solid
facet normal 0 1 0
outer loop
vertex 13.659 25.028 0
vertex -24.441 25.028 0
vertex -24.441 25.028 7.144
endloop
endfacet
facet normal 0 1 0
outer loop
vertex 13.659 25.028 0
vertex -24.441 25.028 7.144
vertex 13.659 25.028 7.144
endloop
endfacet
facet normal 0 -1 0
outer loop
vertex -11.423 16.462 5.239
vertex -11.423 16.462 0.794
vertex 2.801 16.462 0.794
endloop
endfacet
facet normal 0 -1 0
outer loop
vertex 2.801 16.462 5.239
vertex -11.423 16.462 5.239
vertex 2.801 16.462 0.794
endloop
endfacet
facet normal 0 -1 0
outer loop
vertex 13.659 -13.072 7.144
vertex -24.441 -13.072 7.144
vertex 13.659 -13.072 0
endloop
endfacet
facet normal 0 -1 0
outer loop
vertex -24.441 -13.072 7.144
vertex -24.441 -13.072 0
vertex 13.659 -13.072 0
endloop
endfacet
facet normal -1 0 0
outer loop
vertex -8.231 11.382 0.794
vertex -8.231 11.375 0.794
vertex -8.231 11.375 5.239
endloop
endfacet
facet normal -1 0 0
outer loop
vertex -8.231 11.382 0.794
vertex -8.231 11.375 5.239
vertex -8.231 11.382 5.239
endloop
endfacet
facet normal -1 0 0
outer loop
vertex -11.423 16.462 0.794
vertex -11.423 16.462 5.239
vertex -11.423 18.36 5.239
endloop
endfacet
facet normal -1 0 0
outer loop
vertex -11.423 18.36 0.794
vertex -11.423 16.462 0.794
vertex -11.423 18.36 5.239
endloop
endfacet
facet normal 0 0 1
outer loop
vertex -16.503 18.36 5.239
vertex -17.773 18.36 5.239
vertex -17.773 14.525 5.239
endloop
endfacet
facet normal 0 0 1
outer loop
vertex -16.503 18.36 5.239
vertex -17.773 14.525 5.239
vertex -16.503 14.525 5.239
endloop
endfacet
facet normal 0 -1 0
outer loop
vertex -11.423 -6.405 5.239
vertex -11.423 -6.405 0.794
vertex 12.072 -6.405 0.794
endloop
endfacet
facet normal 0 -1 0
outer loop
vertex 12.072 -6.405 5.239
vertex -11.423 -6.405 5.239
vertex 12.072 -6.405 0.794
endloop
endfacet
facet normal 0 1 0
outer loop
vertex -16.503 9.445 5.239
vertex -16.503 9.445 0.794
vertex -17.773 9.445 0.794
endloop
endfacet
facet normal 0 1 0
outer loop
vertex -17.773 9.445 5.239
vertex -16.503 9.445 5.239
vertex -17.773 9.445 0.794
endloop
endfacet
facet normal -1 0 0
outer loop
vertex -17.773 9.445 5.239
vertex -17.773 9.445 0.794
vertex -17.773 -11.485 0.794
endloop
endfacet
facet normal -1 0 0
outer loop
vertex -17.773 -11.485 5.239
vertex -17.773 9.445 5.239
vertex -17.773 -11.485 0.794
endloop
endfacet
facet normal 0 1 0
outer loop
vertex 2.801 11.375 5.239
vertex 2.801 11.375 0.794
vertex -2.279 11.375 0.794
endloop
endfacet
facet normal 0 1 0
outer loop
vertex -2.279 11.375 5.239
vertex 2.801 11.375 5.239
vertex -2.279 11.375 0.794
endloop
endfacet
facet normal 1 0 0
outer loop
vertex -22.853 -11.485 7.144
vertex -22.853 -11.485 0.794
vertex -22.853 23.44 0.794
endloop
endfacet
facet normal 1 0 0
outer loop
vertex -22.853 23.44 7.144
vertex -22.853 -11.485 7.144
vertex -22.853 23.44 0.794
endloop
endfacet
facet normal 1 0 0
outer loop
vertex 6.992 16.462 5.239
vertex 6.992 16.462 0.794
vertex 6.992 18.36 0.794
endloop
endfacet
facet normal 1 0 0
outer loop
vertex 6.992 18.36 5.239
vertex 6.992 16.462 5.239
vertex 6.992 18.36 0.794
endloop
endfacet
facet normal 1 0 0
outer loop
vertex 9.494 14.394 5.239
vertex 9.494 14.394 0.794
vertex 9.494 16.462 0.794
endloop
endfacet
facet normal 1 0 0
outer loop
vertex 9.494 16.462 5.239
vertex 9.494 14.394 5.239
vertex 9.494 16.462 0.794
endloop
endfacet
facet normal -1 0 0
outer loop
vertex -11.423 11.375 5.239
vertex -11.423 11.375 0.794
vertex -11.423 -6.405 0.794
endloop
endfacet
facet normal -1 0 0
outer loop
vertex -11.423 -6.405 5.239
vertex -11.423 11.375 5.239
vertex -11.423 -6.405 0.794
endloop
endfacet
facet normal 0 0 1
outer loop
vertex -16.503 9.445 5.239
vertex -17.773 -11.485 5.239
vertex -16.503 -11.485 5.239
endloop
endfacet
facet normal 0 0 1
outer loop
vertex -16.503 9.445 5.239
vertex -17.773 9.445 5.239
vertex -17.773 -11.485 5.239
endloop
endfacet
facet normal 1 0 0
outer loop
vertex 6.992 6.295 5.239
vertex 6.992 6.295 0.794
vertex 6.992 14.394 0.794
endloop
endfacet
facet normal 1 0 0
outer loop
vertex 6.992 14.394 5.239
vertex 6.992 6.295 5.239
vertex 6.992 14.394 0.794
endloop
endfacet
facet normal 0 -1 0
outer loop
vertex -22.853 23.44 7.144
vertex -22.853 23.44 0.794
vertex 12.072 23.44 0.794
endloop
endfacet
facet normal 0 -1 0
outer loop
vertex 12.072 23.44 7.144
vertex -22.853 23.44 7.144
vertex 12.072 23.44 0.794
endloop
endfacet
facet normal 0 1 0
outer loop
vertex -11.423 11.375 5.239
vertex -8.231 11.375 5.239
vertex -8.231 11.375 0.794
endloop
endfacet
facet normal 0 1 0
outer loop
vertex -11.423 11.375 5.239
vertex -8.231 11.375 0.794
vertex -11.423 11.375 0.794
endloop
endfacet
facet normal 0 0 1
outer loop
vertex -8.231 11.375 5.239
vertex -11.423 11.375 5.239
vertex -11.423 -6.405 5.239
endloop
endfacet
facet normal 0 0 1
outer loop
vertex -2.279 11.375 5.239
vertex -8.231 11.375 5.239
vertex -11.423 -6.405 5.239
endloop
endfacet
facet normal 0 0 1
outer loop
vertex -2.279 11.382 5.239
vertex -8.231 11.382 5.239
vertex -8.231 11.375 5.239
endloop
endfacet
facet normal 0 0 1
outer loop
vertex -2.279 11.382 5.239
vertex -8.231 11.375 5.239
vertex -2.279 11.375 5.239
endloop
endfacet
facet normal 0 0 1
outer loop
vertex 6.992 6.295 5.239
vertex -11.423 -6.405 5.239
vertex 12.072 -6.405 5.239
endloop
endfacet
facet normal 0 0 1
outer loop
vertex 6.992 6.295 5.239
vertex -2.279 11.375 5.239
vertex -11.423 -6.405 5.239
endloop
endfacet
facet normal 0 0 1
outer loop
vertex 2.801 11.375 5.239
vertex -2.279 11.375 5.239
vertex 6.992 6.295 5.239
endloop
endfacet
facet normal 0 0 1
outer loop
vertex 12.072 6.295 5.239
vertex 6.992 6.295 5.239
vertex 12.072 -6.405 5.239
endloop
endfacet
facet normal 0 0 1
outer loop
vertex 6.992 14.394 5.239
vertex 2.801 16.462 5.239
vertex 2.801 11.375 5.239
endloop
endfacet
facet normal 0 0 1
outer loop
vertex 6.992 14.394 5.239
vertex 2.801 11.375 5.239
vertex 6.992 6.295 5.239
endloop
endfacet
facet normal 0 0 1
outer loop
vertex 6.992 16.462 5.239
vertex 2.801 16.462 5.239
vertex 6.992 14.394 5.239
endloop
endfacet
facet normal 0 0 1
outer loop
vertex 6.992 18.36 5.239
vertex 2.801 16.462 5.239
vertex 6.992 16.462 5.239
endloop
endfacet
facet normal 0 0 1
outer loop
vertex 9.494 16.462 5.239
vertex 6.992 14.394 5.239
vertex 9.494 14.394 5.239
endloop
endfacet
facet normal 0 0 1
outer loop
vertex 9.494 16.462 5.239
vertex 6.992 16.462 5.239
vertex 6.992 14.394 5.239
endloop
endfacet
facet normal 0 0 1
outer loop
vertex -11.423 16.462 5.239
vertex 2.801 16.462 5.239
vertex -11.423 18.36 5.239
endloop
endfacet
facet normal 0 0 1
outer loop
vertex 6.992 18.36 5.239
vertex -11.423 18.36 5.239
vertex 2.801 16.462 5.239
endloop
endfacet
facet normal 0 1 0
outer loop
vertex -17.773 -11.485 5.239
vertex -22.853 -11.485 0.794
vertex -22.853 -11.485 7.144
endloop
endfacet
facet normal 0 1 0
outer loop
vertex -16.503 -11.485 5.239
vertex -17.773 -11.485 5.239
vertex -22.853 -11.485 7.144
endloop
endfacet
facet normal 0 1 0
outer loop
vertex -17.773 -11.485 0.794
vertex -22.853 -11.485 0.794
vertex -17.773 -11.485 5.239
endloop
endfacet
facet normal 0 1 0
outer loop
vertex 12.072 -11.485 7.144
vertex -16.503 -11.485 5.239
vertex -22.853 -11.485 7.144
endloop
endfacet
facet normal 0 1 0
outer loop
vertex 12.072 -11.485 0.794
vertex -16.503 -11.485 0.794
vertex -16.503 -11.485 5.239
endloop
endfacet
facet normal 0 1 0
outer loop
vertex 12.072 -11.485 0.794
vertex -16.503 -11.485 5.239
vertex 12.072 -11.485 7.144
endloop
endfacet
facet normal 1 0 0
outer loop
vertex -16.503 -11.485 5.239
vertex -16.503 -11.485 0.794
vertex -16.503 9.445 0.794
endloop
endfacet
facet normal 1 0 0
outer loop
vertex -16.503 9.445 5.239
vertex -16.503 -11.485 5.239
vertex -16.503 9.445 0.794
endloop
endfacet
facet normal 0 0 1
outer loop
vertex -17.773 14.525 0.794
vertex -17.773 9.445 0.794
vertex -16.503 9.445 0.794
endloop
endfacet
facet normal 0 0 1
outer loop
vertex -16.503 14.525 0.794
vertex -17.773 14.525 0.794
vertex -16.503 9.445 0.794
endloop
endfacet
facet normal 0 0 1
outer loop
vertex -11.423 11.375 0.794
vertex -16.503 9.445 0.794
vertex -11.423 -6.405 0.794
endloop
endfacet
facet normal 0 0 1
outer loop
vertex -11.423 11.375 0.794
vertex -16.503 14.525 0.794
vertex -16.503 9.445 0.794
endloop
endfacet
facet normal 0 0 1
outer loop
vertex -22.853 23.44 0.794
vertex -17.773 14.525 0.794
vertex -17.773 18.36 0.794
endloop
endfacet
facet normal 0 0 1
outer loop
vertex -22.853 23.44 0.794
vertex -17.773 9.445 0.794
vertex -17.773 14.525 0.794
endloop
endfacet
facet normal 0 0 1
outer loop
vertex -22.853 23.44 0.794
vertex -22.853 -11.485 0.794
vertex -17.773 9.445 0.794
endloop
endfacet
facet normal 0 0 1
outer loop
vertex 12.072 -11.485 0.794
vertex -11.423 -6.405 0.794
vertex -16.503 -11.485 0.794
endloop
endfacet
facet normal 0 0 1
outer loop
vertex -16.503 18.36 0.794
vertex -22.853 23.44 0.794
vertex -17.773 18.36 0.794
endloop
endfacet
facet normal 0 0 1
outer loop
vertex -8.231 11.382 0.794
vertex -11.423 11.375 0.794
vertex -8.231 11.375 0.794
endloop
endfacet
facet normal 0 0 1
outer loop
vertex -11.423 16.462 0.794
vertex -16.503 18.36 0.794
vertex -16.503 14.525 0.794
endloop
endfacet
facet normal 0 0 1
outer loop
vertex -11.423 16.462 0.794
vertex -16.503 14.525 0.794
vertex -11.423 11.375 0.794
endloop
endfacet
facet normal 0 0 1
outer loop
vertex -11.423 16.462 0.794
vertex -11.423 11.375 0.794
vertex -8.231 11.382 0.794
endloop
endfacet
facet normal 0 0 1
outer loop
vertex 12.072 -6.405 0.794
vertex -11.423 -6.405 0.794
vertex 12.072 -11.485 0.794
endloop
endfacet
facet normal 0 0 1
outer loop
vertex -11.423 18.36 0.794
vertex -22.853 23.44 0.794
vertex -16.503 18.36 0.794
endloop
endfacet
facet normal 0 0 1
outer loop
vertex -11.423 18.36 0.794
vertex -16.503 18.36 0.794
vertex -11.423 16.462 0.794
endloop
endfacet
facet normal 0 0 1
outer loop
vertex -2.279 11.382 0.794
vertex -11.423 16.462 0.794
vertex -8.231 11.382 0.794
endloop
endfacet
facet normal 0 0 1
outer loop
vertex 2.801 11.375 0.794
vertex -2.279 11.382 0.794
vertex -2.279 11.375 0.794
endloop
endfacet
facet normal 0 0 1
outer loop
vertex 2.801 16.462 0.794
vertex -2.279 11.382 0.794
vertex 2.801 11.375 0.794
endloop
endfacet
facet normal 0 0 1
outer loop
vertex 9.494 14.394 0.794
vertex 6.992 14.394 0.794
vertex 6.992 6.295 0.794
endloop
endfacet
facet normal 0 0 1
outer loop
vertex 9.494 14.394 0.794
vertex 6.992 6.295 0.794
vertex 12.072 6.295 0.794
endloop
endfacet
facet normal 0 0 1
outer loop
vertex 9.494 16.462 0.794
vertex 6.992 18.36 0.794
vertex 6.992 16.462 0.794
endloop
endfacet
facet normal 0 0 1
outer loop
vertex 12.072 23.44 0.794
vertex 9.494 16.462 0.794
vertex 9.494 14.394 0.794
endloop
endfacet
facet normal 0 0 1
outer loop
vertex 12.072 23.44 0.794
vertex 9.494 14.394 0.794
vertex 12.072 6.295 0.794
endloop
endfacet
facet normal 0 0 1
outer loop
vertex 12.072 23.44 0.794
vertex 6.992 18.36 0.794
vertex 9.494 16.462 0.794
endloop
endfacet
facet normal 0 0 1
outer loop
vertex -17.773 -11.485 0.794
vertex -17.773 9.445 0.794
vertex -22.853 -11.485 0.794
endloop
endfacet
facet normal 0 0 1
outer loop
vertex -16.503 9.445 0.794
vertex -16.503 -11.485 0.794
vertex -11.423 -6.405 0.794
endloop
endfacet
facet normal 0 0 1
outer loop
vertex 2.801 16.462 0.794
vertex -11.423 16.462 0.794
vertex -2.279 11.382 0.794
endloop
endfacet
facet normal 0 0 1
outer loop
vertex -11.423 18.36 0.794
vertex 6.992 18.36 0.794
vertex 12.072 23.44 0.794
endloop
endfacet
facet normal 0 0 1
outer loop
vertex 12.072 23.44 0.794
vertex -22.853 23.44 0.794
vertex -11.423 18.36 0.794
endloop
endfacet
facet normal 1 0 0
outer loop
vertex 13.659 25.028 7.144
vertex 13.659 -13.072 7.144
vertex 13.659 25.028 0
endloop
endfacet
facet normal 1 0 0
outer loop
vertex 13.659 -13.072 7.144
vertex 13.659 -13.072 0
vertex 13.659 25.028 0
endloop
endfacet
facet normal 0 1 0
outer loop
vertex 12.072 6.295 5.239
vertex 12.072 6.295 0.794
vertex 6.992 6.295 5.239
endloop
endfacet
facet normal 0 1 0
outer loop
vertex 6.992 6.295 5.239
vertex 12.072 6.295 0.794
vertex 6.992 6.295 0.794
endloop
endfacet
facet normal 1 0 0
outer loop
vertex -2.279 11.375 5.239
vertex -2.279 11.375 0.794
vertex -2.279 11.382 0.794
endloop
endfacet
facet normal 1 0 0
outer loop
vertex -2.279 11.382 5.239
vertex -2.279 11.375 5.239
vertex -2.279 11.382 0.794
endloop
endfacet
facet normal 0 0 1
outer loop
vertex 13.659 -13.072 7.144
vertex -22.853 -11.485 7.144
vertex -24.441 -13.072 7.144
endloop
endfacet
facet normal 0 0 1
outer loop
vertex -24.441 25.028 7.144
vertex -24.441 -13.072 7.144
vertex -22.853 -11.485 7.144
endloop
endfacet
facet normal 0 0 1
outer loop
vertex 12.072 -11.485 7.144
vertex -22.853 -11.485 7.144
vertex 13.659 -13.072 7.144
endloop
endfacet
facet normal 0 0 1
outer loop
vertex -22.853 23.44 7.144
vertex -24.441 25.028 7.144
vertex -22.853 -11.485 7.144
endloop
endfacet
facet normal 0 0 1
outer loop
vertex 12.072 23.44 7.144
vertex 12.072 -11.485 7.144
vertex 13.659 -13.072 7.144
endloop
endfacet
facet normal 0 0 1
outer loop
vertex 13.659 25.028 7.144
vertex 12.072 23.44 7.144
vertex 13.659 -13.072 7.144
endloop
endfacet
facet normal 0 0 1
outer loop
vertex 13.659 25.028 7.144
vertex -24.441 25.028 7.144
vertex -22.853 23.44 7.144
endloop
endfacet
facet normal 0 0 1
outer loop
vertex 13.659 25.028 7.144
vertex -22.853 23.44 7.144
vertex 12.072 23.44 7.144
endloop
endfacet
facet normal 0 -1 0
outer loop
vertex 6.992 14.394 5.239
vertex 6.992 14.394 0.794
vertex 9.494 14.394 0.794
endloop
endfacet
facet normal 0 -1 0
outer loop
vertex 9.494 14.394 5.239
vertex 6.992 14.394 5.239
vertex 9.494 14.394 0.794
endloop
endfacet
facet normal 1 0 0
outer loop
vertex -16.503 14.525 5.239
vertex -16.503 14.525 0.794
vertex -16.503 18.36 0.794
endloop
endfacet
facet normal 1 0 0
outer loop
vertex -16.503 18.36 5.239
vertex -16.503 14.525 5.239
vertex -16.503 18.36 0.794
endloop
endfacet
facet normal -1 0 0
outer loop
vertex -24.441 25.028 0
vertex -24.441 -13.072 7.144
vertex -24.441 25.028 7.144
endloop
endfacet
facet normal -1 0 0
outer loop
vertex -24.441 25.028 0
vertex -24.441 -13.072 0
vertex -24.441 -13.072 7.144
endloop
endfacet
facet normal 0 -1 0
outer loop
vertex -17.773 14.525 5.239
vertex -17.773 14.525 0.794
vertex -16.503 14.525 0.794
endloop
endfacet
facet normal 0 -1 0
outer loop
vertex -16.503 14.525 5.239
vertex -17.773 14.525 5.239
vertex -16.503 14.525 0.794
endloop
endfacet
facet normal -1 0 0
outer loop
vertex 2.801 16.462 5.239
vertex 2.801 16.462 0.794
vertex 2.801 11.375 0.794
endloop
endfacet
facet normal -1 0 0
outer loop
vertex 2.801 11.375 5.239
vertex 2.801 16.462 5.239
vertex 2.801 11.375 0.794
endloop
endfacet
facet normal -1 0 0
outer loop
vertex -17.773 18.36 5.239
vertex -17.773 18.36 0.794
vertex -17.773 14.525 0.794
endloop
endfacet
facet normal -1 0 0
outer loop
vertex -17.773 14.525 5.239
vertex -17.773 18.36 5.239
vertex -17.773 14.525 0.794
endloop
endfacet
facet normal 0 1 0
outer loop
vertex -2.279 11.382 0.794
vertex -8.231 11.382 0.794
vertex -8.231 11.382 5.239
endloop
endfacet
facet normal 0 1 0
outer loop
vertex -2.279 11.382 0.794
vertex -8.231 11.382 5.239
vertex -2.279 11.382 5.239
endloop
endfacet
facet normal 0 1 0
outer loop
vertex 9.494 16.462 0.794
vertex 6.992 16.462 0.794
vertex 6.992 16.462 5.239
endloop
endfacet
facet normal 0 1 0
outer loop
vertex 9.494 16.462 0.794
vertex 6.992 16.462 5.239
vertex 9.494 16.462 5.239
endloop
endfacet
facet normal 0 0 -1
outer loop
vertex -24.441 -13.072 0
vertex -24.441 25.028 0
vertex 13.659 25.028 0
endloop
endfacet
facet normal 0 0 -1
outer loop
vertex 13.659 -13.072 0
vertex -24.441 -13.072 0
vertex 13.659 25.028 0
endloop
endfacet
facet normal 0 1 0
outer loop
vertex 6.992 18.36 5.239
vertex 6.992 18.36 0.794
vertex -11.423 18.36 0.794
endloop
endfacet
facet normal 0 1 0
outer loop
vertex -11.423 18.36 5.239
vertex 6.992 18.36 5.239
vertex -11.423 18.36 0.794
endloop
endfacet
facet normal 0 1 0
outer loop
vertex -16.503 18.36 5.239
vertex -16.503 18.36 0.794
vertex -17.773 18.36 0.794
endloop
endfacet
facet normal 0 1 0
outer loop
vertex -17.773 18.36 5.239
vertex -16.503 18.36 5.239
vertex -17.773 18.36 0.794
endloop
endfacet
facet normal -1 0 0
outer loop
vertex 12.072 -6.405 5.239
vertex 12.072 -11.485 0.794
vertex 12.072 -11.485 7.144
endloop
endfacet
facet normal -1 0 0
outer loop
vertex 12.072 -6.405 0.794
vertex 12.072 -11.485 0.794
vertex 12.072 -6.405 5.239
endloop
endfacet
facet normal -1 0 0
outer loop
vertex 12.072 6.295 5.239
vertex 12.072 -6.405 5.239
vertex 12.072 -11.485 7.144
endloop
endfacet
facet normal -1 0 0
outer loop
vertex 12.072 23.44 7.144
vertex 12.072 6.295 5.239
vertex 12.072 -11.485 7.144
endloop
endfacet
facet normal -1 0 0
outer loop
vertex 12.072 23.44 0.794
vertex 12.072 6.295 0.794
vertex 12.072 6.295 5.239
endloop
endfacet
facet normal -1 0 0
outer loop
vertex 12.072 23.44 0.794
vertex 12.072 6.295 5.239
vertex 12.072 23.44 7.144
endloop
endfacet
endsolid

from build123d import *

# Parameters (mm, degrees)
F0_W     = 38.1
F0_H     = 38.1
F1_DEPTH = 0.79375
F2_W     = 38.1
F2_H     = 38.1
F2_W_2   = 34.925
F2_H_2   = 34.925
F3_DEPTH = 6.35
F4_W     = 14.224
F4_H     = 1.898194
F4_W_2   = 2.502164
F4_H_2   = 2.067971
F4_W_3   = 5.951583
F4_H_3   = 0.006806
F4_W_4   = 18.415
F4_H_4   = 2.333408
F5_DEPTH = 4.445


with BuildPart() as f1:
    # F0 (on Top) → F1 (new body)
    with BuildSketch(Plane.XY):
        with Locations((-5.390748, 5.977843)):
            Rectangle(F0_W, F0_H)
    extrude(amount=F1_DEPTH)

    # F2 (on face) → F3 (join)
    with BuildSketch(Plane.XY.offset(0.79375)):
        with Locations((-5.390748, 5.977843)):
            Rectangle(F2_W, F2_H)
        with Locations((-5.390748, 5.977843)):
            Rectangle(F2_W_2, F2_H_2, mode=Mode.SUBTRACT)
    extrude(amount=F3_DEPTH)

    # F4 (on face) → F5 (join)
    with BuildSketch(Plane.XY.offset(0.79375)):
        Polygon((-17.773248, -11.484657), (-16.99117, -11.484657), (-16.503248, -11.484657), (-16.503248, 9.445464), (-17.773248, 9.445464), align=None)
        Polygon((-16.503248, 18.360343), (-16.99117, 18.360343), (-17.773248, 18.360343), (-17.773248, 17.845441), (-16.503248, 17.845441), align=None)
        Polygon((-16.503248, 17.845441), (-17.773248, 17.845441), (-17.773248, 16.637499), (-17.773248, 14.525464), (-16.503248, 14.525464), align=None)
        with Locations((-4.311248, 17.411246)):
            Rectangle(F4_W, F4_H)
        Polygon((6.991752, 18.360343), (2.800752, 18.360343), (2.800752, 16.462149), (2.800752, 11.375343), (6.991752, 11.375343), (6.991752, 14.394178), (6.991752, 16.462149), align=None)
        Polygon((6.991752, 11.375343), (2.800752, 11.375343), (-2.279248, 11.375343), (-8.230831, 11.375343), (-11.423248, 11.375343), (-11.423248, 6.295343), (6.991752, 6.295343), align=None)
        with Locations((8.242834, 15.428164)):
            Rectangle(F4_W_2, F4_H_2)
        with Locations((-5.25504, 11.378746)):
            Rectangle(F4_W_3, F4_H_3)
        Polygon((12.071752, 6.295343), (6.991752, 6.295343), (6.991752, 3.961935), (-11.423248, 3.961935), (-11.423248, -6.404657), (12.071752, -6.404657), align=None)
        with Locations((-2.215748, 5.128639)):
            Rectangle(F4_W_4, F4_H_4)
    extrude(amount=F5_DEPTH)


solid = f1.part
